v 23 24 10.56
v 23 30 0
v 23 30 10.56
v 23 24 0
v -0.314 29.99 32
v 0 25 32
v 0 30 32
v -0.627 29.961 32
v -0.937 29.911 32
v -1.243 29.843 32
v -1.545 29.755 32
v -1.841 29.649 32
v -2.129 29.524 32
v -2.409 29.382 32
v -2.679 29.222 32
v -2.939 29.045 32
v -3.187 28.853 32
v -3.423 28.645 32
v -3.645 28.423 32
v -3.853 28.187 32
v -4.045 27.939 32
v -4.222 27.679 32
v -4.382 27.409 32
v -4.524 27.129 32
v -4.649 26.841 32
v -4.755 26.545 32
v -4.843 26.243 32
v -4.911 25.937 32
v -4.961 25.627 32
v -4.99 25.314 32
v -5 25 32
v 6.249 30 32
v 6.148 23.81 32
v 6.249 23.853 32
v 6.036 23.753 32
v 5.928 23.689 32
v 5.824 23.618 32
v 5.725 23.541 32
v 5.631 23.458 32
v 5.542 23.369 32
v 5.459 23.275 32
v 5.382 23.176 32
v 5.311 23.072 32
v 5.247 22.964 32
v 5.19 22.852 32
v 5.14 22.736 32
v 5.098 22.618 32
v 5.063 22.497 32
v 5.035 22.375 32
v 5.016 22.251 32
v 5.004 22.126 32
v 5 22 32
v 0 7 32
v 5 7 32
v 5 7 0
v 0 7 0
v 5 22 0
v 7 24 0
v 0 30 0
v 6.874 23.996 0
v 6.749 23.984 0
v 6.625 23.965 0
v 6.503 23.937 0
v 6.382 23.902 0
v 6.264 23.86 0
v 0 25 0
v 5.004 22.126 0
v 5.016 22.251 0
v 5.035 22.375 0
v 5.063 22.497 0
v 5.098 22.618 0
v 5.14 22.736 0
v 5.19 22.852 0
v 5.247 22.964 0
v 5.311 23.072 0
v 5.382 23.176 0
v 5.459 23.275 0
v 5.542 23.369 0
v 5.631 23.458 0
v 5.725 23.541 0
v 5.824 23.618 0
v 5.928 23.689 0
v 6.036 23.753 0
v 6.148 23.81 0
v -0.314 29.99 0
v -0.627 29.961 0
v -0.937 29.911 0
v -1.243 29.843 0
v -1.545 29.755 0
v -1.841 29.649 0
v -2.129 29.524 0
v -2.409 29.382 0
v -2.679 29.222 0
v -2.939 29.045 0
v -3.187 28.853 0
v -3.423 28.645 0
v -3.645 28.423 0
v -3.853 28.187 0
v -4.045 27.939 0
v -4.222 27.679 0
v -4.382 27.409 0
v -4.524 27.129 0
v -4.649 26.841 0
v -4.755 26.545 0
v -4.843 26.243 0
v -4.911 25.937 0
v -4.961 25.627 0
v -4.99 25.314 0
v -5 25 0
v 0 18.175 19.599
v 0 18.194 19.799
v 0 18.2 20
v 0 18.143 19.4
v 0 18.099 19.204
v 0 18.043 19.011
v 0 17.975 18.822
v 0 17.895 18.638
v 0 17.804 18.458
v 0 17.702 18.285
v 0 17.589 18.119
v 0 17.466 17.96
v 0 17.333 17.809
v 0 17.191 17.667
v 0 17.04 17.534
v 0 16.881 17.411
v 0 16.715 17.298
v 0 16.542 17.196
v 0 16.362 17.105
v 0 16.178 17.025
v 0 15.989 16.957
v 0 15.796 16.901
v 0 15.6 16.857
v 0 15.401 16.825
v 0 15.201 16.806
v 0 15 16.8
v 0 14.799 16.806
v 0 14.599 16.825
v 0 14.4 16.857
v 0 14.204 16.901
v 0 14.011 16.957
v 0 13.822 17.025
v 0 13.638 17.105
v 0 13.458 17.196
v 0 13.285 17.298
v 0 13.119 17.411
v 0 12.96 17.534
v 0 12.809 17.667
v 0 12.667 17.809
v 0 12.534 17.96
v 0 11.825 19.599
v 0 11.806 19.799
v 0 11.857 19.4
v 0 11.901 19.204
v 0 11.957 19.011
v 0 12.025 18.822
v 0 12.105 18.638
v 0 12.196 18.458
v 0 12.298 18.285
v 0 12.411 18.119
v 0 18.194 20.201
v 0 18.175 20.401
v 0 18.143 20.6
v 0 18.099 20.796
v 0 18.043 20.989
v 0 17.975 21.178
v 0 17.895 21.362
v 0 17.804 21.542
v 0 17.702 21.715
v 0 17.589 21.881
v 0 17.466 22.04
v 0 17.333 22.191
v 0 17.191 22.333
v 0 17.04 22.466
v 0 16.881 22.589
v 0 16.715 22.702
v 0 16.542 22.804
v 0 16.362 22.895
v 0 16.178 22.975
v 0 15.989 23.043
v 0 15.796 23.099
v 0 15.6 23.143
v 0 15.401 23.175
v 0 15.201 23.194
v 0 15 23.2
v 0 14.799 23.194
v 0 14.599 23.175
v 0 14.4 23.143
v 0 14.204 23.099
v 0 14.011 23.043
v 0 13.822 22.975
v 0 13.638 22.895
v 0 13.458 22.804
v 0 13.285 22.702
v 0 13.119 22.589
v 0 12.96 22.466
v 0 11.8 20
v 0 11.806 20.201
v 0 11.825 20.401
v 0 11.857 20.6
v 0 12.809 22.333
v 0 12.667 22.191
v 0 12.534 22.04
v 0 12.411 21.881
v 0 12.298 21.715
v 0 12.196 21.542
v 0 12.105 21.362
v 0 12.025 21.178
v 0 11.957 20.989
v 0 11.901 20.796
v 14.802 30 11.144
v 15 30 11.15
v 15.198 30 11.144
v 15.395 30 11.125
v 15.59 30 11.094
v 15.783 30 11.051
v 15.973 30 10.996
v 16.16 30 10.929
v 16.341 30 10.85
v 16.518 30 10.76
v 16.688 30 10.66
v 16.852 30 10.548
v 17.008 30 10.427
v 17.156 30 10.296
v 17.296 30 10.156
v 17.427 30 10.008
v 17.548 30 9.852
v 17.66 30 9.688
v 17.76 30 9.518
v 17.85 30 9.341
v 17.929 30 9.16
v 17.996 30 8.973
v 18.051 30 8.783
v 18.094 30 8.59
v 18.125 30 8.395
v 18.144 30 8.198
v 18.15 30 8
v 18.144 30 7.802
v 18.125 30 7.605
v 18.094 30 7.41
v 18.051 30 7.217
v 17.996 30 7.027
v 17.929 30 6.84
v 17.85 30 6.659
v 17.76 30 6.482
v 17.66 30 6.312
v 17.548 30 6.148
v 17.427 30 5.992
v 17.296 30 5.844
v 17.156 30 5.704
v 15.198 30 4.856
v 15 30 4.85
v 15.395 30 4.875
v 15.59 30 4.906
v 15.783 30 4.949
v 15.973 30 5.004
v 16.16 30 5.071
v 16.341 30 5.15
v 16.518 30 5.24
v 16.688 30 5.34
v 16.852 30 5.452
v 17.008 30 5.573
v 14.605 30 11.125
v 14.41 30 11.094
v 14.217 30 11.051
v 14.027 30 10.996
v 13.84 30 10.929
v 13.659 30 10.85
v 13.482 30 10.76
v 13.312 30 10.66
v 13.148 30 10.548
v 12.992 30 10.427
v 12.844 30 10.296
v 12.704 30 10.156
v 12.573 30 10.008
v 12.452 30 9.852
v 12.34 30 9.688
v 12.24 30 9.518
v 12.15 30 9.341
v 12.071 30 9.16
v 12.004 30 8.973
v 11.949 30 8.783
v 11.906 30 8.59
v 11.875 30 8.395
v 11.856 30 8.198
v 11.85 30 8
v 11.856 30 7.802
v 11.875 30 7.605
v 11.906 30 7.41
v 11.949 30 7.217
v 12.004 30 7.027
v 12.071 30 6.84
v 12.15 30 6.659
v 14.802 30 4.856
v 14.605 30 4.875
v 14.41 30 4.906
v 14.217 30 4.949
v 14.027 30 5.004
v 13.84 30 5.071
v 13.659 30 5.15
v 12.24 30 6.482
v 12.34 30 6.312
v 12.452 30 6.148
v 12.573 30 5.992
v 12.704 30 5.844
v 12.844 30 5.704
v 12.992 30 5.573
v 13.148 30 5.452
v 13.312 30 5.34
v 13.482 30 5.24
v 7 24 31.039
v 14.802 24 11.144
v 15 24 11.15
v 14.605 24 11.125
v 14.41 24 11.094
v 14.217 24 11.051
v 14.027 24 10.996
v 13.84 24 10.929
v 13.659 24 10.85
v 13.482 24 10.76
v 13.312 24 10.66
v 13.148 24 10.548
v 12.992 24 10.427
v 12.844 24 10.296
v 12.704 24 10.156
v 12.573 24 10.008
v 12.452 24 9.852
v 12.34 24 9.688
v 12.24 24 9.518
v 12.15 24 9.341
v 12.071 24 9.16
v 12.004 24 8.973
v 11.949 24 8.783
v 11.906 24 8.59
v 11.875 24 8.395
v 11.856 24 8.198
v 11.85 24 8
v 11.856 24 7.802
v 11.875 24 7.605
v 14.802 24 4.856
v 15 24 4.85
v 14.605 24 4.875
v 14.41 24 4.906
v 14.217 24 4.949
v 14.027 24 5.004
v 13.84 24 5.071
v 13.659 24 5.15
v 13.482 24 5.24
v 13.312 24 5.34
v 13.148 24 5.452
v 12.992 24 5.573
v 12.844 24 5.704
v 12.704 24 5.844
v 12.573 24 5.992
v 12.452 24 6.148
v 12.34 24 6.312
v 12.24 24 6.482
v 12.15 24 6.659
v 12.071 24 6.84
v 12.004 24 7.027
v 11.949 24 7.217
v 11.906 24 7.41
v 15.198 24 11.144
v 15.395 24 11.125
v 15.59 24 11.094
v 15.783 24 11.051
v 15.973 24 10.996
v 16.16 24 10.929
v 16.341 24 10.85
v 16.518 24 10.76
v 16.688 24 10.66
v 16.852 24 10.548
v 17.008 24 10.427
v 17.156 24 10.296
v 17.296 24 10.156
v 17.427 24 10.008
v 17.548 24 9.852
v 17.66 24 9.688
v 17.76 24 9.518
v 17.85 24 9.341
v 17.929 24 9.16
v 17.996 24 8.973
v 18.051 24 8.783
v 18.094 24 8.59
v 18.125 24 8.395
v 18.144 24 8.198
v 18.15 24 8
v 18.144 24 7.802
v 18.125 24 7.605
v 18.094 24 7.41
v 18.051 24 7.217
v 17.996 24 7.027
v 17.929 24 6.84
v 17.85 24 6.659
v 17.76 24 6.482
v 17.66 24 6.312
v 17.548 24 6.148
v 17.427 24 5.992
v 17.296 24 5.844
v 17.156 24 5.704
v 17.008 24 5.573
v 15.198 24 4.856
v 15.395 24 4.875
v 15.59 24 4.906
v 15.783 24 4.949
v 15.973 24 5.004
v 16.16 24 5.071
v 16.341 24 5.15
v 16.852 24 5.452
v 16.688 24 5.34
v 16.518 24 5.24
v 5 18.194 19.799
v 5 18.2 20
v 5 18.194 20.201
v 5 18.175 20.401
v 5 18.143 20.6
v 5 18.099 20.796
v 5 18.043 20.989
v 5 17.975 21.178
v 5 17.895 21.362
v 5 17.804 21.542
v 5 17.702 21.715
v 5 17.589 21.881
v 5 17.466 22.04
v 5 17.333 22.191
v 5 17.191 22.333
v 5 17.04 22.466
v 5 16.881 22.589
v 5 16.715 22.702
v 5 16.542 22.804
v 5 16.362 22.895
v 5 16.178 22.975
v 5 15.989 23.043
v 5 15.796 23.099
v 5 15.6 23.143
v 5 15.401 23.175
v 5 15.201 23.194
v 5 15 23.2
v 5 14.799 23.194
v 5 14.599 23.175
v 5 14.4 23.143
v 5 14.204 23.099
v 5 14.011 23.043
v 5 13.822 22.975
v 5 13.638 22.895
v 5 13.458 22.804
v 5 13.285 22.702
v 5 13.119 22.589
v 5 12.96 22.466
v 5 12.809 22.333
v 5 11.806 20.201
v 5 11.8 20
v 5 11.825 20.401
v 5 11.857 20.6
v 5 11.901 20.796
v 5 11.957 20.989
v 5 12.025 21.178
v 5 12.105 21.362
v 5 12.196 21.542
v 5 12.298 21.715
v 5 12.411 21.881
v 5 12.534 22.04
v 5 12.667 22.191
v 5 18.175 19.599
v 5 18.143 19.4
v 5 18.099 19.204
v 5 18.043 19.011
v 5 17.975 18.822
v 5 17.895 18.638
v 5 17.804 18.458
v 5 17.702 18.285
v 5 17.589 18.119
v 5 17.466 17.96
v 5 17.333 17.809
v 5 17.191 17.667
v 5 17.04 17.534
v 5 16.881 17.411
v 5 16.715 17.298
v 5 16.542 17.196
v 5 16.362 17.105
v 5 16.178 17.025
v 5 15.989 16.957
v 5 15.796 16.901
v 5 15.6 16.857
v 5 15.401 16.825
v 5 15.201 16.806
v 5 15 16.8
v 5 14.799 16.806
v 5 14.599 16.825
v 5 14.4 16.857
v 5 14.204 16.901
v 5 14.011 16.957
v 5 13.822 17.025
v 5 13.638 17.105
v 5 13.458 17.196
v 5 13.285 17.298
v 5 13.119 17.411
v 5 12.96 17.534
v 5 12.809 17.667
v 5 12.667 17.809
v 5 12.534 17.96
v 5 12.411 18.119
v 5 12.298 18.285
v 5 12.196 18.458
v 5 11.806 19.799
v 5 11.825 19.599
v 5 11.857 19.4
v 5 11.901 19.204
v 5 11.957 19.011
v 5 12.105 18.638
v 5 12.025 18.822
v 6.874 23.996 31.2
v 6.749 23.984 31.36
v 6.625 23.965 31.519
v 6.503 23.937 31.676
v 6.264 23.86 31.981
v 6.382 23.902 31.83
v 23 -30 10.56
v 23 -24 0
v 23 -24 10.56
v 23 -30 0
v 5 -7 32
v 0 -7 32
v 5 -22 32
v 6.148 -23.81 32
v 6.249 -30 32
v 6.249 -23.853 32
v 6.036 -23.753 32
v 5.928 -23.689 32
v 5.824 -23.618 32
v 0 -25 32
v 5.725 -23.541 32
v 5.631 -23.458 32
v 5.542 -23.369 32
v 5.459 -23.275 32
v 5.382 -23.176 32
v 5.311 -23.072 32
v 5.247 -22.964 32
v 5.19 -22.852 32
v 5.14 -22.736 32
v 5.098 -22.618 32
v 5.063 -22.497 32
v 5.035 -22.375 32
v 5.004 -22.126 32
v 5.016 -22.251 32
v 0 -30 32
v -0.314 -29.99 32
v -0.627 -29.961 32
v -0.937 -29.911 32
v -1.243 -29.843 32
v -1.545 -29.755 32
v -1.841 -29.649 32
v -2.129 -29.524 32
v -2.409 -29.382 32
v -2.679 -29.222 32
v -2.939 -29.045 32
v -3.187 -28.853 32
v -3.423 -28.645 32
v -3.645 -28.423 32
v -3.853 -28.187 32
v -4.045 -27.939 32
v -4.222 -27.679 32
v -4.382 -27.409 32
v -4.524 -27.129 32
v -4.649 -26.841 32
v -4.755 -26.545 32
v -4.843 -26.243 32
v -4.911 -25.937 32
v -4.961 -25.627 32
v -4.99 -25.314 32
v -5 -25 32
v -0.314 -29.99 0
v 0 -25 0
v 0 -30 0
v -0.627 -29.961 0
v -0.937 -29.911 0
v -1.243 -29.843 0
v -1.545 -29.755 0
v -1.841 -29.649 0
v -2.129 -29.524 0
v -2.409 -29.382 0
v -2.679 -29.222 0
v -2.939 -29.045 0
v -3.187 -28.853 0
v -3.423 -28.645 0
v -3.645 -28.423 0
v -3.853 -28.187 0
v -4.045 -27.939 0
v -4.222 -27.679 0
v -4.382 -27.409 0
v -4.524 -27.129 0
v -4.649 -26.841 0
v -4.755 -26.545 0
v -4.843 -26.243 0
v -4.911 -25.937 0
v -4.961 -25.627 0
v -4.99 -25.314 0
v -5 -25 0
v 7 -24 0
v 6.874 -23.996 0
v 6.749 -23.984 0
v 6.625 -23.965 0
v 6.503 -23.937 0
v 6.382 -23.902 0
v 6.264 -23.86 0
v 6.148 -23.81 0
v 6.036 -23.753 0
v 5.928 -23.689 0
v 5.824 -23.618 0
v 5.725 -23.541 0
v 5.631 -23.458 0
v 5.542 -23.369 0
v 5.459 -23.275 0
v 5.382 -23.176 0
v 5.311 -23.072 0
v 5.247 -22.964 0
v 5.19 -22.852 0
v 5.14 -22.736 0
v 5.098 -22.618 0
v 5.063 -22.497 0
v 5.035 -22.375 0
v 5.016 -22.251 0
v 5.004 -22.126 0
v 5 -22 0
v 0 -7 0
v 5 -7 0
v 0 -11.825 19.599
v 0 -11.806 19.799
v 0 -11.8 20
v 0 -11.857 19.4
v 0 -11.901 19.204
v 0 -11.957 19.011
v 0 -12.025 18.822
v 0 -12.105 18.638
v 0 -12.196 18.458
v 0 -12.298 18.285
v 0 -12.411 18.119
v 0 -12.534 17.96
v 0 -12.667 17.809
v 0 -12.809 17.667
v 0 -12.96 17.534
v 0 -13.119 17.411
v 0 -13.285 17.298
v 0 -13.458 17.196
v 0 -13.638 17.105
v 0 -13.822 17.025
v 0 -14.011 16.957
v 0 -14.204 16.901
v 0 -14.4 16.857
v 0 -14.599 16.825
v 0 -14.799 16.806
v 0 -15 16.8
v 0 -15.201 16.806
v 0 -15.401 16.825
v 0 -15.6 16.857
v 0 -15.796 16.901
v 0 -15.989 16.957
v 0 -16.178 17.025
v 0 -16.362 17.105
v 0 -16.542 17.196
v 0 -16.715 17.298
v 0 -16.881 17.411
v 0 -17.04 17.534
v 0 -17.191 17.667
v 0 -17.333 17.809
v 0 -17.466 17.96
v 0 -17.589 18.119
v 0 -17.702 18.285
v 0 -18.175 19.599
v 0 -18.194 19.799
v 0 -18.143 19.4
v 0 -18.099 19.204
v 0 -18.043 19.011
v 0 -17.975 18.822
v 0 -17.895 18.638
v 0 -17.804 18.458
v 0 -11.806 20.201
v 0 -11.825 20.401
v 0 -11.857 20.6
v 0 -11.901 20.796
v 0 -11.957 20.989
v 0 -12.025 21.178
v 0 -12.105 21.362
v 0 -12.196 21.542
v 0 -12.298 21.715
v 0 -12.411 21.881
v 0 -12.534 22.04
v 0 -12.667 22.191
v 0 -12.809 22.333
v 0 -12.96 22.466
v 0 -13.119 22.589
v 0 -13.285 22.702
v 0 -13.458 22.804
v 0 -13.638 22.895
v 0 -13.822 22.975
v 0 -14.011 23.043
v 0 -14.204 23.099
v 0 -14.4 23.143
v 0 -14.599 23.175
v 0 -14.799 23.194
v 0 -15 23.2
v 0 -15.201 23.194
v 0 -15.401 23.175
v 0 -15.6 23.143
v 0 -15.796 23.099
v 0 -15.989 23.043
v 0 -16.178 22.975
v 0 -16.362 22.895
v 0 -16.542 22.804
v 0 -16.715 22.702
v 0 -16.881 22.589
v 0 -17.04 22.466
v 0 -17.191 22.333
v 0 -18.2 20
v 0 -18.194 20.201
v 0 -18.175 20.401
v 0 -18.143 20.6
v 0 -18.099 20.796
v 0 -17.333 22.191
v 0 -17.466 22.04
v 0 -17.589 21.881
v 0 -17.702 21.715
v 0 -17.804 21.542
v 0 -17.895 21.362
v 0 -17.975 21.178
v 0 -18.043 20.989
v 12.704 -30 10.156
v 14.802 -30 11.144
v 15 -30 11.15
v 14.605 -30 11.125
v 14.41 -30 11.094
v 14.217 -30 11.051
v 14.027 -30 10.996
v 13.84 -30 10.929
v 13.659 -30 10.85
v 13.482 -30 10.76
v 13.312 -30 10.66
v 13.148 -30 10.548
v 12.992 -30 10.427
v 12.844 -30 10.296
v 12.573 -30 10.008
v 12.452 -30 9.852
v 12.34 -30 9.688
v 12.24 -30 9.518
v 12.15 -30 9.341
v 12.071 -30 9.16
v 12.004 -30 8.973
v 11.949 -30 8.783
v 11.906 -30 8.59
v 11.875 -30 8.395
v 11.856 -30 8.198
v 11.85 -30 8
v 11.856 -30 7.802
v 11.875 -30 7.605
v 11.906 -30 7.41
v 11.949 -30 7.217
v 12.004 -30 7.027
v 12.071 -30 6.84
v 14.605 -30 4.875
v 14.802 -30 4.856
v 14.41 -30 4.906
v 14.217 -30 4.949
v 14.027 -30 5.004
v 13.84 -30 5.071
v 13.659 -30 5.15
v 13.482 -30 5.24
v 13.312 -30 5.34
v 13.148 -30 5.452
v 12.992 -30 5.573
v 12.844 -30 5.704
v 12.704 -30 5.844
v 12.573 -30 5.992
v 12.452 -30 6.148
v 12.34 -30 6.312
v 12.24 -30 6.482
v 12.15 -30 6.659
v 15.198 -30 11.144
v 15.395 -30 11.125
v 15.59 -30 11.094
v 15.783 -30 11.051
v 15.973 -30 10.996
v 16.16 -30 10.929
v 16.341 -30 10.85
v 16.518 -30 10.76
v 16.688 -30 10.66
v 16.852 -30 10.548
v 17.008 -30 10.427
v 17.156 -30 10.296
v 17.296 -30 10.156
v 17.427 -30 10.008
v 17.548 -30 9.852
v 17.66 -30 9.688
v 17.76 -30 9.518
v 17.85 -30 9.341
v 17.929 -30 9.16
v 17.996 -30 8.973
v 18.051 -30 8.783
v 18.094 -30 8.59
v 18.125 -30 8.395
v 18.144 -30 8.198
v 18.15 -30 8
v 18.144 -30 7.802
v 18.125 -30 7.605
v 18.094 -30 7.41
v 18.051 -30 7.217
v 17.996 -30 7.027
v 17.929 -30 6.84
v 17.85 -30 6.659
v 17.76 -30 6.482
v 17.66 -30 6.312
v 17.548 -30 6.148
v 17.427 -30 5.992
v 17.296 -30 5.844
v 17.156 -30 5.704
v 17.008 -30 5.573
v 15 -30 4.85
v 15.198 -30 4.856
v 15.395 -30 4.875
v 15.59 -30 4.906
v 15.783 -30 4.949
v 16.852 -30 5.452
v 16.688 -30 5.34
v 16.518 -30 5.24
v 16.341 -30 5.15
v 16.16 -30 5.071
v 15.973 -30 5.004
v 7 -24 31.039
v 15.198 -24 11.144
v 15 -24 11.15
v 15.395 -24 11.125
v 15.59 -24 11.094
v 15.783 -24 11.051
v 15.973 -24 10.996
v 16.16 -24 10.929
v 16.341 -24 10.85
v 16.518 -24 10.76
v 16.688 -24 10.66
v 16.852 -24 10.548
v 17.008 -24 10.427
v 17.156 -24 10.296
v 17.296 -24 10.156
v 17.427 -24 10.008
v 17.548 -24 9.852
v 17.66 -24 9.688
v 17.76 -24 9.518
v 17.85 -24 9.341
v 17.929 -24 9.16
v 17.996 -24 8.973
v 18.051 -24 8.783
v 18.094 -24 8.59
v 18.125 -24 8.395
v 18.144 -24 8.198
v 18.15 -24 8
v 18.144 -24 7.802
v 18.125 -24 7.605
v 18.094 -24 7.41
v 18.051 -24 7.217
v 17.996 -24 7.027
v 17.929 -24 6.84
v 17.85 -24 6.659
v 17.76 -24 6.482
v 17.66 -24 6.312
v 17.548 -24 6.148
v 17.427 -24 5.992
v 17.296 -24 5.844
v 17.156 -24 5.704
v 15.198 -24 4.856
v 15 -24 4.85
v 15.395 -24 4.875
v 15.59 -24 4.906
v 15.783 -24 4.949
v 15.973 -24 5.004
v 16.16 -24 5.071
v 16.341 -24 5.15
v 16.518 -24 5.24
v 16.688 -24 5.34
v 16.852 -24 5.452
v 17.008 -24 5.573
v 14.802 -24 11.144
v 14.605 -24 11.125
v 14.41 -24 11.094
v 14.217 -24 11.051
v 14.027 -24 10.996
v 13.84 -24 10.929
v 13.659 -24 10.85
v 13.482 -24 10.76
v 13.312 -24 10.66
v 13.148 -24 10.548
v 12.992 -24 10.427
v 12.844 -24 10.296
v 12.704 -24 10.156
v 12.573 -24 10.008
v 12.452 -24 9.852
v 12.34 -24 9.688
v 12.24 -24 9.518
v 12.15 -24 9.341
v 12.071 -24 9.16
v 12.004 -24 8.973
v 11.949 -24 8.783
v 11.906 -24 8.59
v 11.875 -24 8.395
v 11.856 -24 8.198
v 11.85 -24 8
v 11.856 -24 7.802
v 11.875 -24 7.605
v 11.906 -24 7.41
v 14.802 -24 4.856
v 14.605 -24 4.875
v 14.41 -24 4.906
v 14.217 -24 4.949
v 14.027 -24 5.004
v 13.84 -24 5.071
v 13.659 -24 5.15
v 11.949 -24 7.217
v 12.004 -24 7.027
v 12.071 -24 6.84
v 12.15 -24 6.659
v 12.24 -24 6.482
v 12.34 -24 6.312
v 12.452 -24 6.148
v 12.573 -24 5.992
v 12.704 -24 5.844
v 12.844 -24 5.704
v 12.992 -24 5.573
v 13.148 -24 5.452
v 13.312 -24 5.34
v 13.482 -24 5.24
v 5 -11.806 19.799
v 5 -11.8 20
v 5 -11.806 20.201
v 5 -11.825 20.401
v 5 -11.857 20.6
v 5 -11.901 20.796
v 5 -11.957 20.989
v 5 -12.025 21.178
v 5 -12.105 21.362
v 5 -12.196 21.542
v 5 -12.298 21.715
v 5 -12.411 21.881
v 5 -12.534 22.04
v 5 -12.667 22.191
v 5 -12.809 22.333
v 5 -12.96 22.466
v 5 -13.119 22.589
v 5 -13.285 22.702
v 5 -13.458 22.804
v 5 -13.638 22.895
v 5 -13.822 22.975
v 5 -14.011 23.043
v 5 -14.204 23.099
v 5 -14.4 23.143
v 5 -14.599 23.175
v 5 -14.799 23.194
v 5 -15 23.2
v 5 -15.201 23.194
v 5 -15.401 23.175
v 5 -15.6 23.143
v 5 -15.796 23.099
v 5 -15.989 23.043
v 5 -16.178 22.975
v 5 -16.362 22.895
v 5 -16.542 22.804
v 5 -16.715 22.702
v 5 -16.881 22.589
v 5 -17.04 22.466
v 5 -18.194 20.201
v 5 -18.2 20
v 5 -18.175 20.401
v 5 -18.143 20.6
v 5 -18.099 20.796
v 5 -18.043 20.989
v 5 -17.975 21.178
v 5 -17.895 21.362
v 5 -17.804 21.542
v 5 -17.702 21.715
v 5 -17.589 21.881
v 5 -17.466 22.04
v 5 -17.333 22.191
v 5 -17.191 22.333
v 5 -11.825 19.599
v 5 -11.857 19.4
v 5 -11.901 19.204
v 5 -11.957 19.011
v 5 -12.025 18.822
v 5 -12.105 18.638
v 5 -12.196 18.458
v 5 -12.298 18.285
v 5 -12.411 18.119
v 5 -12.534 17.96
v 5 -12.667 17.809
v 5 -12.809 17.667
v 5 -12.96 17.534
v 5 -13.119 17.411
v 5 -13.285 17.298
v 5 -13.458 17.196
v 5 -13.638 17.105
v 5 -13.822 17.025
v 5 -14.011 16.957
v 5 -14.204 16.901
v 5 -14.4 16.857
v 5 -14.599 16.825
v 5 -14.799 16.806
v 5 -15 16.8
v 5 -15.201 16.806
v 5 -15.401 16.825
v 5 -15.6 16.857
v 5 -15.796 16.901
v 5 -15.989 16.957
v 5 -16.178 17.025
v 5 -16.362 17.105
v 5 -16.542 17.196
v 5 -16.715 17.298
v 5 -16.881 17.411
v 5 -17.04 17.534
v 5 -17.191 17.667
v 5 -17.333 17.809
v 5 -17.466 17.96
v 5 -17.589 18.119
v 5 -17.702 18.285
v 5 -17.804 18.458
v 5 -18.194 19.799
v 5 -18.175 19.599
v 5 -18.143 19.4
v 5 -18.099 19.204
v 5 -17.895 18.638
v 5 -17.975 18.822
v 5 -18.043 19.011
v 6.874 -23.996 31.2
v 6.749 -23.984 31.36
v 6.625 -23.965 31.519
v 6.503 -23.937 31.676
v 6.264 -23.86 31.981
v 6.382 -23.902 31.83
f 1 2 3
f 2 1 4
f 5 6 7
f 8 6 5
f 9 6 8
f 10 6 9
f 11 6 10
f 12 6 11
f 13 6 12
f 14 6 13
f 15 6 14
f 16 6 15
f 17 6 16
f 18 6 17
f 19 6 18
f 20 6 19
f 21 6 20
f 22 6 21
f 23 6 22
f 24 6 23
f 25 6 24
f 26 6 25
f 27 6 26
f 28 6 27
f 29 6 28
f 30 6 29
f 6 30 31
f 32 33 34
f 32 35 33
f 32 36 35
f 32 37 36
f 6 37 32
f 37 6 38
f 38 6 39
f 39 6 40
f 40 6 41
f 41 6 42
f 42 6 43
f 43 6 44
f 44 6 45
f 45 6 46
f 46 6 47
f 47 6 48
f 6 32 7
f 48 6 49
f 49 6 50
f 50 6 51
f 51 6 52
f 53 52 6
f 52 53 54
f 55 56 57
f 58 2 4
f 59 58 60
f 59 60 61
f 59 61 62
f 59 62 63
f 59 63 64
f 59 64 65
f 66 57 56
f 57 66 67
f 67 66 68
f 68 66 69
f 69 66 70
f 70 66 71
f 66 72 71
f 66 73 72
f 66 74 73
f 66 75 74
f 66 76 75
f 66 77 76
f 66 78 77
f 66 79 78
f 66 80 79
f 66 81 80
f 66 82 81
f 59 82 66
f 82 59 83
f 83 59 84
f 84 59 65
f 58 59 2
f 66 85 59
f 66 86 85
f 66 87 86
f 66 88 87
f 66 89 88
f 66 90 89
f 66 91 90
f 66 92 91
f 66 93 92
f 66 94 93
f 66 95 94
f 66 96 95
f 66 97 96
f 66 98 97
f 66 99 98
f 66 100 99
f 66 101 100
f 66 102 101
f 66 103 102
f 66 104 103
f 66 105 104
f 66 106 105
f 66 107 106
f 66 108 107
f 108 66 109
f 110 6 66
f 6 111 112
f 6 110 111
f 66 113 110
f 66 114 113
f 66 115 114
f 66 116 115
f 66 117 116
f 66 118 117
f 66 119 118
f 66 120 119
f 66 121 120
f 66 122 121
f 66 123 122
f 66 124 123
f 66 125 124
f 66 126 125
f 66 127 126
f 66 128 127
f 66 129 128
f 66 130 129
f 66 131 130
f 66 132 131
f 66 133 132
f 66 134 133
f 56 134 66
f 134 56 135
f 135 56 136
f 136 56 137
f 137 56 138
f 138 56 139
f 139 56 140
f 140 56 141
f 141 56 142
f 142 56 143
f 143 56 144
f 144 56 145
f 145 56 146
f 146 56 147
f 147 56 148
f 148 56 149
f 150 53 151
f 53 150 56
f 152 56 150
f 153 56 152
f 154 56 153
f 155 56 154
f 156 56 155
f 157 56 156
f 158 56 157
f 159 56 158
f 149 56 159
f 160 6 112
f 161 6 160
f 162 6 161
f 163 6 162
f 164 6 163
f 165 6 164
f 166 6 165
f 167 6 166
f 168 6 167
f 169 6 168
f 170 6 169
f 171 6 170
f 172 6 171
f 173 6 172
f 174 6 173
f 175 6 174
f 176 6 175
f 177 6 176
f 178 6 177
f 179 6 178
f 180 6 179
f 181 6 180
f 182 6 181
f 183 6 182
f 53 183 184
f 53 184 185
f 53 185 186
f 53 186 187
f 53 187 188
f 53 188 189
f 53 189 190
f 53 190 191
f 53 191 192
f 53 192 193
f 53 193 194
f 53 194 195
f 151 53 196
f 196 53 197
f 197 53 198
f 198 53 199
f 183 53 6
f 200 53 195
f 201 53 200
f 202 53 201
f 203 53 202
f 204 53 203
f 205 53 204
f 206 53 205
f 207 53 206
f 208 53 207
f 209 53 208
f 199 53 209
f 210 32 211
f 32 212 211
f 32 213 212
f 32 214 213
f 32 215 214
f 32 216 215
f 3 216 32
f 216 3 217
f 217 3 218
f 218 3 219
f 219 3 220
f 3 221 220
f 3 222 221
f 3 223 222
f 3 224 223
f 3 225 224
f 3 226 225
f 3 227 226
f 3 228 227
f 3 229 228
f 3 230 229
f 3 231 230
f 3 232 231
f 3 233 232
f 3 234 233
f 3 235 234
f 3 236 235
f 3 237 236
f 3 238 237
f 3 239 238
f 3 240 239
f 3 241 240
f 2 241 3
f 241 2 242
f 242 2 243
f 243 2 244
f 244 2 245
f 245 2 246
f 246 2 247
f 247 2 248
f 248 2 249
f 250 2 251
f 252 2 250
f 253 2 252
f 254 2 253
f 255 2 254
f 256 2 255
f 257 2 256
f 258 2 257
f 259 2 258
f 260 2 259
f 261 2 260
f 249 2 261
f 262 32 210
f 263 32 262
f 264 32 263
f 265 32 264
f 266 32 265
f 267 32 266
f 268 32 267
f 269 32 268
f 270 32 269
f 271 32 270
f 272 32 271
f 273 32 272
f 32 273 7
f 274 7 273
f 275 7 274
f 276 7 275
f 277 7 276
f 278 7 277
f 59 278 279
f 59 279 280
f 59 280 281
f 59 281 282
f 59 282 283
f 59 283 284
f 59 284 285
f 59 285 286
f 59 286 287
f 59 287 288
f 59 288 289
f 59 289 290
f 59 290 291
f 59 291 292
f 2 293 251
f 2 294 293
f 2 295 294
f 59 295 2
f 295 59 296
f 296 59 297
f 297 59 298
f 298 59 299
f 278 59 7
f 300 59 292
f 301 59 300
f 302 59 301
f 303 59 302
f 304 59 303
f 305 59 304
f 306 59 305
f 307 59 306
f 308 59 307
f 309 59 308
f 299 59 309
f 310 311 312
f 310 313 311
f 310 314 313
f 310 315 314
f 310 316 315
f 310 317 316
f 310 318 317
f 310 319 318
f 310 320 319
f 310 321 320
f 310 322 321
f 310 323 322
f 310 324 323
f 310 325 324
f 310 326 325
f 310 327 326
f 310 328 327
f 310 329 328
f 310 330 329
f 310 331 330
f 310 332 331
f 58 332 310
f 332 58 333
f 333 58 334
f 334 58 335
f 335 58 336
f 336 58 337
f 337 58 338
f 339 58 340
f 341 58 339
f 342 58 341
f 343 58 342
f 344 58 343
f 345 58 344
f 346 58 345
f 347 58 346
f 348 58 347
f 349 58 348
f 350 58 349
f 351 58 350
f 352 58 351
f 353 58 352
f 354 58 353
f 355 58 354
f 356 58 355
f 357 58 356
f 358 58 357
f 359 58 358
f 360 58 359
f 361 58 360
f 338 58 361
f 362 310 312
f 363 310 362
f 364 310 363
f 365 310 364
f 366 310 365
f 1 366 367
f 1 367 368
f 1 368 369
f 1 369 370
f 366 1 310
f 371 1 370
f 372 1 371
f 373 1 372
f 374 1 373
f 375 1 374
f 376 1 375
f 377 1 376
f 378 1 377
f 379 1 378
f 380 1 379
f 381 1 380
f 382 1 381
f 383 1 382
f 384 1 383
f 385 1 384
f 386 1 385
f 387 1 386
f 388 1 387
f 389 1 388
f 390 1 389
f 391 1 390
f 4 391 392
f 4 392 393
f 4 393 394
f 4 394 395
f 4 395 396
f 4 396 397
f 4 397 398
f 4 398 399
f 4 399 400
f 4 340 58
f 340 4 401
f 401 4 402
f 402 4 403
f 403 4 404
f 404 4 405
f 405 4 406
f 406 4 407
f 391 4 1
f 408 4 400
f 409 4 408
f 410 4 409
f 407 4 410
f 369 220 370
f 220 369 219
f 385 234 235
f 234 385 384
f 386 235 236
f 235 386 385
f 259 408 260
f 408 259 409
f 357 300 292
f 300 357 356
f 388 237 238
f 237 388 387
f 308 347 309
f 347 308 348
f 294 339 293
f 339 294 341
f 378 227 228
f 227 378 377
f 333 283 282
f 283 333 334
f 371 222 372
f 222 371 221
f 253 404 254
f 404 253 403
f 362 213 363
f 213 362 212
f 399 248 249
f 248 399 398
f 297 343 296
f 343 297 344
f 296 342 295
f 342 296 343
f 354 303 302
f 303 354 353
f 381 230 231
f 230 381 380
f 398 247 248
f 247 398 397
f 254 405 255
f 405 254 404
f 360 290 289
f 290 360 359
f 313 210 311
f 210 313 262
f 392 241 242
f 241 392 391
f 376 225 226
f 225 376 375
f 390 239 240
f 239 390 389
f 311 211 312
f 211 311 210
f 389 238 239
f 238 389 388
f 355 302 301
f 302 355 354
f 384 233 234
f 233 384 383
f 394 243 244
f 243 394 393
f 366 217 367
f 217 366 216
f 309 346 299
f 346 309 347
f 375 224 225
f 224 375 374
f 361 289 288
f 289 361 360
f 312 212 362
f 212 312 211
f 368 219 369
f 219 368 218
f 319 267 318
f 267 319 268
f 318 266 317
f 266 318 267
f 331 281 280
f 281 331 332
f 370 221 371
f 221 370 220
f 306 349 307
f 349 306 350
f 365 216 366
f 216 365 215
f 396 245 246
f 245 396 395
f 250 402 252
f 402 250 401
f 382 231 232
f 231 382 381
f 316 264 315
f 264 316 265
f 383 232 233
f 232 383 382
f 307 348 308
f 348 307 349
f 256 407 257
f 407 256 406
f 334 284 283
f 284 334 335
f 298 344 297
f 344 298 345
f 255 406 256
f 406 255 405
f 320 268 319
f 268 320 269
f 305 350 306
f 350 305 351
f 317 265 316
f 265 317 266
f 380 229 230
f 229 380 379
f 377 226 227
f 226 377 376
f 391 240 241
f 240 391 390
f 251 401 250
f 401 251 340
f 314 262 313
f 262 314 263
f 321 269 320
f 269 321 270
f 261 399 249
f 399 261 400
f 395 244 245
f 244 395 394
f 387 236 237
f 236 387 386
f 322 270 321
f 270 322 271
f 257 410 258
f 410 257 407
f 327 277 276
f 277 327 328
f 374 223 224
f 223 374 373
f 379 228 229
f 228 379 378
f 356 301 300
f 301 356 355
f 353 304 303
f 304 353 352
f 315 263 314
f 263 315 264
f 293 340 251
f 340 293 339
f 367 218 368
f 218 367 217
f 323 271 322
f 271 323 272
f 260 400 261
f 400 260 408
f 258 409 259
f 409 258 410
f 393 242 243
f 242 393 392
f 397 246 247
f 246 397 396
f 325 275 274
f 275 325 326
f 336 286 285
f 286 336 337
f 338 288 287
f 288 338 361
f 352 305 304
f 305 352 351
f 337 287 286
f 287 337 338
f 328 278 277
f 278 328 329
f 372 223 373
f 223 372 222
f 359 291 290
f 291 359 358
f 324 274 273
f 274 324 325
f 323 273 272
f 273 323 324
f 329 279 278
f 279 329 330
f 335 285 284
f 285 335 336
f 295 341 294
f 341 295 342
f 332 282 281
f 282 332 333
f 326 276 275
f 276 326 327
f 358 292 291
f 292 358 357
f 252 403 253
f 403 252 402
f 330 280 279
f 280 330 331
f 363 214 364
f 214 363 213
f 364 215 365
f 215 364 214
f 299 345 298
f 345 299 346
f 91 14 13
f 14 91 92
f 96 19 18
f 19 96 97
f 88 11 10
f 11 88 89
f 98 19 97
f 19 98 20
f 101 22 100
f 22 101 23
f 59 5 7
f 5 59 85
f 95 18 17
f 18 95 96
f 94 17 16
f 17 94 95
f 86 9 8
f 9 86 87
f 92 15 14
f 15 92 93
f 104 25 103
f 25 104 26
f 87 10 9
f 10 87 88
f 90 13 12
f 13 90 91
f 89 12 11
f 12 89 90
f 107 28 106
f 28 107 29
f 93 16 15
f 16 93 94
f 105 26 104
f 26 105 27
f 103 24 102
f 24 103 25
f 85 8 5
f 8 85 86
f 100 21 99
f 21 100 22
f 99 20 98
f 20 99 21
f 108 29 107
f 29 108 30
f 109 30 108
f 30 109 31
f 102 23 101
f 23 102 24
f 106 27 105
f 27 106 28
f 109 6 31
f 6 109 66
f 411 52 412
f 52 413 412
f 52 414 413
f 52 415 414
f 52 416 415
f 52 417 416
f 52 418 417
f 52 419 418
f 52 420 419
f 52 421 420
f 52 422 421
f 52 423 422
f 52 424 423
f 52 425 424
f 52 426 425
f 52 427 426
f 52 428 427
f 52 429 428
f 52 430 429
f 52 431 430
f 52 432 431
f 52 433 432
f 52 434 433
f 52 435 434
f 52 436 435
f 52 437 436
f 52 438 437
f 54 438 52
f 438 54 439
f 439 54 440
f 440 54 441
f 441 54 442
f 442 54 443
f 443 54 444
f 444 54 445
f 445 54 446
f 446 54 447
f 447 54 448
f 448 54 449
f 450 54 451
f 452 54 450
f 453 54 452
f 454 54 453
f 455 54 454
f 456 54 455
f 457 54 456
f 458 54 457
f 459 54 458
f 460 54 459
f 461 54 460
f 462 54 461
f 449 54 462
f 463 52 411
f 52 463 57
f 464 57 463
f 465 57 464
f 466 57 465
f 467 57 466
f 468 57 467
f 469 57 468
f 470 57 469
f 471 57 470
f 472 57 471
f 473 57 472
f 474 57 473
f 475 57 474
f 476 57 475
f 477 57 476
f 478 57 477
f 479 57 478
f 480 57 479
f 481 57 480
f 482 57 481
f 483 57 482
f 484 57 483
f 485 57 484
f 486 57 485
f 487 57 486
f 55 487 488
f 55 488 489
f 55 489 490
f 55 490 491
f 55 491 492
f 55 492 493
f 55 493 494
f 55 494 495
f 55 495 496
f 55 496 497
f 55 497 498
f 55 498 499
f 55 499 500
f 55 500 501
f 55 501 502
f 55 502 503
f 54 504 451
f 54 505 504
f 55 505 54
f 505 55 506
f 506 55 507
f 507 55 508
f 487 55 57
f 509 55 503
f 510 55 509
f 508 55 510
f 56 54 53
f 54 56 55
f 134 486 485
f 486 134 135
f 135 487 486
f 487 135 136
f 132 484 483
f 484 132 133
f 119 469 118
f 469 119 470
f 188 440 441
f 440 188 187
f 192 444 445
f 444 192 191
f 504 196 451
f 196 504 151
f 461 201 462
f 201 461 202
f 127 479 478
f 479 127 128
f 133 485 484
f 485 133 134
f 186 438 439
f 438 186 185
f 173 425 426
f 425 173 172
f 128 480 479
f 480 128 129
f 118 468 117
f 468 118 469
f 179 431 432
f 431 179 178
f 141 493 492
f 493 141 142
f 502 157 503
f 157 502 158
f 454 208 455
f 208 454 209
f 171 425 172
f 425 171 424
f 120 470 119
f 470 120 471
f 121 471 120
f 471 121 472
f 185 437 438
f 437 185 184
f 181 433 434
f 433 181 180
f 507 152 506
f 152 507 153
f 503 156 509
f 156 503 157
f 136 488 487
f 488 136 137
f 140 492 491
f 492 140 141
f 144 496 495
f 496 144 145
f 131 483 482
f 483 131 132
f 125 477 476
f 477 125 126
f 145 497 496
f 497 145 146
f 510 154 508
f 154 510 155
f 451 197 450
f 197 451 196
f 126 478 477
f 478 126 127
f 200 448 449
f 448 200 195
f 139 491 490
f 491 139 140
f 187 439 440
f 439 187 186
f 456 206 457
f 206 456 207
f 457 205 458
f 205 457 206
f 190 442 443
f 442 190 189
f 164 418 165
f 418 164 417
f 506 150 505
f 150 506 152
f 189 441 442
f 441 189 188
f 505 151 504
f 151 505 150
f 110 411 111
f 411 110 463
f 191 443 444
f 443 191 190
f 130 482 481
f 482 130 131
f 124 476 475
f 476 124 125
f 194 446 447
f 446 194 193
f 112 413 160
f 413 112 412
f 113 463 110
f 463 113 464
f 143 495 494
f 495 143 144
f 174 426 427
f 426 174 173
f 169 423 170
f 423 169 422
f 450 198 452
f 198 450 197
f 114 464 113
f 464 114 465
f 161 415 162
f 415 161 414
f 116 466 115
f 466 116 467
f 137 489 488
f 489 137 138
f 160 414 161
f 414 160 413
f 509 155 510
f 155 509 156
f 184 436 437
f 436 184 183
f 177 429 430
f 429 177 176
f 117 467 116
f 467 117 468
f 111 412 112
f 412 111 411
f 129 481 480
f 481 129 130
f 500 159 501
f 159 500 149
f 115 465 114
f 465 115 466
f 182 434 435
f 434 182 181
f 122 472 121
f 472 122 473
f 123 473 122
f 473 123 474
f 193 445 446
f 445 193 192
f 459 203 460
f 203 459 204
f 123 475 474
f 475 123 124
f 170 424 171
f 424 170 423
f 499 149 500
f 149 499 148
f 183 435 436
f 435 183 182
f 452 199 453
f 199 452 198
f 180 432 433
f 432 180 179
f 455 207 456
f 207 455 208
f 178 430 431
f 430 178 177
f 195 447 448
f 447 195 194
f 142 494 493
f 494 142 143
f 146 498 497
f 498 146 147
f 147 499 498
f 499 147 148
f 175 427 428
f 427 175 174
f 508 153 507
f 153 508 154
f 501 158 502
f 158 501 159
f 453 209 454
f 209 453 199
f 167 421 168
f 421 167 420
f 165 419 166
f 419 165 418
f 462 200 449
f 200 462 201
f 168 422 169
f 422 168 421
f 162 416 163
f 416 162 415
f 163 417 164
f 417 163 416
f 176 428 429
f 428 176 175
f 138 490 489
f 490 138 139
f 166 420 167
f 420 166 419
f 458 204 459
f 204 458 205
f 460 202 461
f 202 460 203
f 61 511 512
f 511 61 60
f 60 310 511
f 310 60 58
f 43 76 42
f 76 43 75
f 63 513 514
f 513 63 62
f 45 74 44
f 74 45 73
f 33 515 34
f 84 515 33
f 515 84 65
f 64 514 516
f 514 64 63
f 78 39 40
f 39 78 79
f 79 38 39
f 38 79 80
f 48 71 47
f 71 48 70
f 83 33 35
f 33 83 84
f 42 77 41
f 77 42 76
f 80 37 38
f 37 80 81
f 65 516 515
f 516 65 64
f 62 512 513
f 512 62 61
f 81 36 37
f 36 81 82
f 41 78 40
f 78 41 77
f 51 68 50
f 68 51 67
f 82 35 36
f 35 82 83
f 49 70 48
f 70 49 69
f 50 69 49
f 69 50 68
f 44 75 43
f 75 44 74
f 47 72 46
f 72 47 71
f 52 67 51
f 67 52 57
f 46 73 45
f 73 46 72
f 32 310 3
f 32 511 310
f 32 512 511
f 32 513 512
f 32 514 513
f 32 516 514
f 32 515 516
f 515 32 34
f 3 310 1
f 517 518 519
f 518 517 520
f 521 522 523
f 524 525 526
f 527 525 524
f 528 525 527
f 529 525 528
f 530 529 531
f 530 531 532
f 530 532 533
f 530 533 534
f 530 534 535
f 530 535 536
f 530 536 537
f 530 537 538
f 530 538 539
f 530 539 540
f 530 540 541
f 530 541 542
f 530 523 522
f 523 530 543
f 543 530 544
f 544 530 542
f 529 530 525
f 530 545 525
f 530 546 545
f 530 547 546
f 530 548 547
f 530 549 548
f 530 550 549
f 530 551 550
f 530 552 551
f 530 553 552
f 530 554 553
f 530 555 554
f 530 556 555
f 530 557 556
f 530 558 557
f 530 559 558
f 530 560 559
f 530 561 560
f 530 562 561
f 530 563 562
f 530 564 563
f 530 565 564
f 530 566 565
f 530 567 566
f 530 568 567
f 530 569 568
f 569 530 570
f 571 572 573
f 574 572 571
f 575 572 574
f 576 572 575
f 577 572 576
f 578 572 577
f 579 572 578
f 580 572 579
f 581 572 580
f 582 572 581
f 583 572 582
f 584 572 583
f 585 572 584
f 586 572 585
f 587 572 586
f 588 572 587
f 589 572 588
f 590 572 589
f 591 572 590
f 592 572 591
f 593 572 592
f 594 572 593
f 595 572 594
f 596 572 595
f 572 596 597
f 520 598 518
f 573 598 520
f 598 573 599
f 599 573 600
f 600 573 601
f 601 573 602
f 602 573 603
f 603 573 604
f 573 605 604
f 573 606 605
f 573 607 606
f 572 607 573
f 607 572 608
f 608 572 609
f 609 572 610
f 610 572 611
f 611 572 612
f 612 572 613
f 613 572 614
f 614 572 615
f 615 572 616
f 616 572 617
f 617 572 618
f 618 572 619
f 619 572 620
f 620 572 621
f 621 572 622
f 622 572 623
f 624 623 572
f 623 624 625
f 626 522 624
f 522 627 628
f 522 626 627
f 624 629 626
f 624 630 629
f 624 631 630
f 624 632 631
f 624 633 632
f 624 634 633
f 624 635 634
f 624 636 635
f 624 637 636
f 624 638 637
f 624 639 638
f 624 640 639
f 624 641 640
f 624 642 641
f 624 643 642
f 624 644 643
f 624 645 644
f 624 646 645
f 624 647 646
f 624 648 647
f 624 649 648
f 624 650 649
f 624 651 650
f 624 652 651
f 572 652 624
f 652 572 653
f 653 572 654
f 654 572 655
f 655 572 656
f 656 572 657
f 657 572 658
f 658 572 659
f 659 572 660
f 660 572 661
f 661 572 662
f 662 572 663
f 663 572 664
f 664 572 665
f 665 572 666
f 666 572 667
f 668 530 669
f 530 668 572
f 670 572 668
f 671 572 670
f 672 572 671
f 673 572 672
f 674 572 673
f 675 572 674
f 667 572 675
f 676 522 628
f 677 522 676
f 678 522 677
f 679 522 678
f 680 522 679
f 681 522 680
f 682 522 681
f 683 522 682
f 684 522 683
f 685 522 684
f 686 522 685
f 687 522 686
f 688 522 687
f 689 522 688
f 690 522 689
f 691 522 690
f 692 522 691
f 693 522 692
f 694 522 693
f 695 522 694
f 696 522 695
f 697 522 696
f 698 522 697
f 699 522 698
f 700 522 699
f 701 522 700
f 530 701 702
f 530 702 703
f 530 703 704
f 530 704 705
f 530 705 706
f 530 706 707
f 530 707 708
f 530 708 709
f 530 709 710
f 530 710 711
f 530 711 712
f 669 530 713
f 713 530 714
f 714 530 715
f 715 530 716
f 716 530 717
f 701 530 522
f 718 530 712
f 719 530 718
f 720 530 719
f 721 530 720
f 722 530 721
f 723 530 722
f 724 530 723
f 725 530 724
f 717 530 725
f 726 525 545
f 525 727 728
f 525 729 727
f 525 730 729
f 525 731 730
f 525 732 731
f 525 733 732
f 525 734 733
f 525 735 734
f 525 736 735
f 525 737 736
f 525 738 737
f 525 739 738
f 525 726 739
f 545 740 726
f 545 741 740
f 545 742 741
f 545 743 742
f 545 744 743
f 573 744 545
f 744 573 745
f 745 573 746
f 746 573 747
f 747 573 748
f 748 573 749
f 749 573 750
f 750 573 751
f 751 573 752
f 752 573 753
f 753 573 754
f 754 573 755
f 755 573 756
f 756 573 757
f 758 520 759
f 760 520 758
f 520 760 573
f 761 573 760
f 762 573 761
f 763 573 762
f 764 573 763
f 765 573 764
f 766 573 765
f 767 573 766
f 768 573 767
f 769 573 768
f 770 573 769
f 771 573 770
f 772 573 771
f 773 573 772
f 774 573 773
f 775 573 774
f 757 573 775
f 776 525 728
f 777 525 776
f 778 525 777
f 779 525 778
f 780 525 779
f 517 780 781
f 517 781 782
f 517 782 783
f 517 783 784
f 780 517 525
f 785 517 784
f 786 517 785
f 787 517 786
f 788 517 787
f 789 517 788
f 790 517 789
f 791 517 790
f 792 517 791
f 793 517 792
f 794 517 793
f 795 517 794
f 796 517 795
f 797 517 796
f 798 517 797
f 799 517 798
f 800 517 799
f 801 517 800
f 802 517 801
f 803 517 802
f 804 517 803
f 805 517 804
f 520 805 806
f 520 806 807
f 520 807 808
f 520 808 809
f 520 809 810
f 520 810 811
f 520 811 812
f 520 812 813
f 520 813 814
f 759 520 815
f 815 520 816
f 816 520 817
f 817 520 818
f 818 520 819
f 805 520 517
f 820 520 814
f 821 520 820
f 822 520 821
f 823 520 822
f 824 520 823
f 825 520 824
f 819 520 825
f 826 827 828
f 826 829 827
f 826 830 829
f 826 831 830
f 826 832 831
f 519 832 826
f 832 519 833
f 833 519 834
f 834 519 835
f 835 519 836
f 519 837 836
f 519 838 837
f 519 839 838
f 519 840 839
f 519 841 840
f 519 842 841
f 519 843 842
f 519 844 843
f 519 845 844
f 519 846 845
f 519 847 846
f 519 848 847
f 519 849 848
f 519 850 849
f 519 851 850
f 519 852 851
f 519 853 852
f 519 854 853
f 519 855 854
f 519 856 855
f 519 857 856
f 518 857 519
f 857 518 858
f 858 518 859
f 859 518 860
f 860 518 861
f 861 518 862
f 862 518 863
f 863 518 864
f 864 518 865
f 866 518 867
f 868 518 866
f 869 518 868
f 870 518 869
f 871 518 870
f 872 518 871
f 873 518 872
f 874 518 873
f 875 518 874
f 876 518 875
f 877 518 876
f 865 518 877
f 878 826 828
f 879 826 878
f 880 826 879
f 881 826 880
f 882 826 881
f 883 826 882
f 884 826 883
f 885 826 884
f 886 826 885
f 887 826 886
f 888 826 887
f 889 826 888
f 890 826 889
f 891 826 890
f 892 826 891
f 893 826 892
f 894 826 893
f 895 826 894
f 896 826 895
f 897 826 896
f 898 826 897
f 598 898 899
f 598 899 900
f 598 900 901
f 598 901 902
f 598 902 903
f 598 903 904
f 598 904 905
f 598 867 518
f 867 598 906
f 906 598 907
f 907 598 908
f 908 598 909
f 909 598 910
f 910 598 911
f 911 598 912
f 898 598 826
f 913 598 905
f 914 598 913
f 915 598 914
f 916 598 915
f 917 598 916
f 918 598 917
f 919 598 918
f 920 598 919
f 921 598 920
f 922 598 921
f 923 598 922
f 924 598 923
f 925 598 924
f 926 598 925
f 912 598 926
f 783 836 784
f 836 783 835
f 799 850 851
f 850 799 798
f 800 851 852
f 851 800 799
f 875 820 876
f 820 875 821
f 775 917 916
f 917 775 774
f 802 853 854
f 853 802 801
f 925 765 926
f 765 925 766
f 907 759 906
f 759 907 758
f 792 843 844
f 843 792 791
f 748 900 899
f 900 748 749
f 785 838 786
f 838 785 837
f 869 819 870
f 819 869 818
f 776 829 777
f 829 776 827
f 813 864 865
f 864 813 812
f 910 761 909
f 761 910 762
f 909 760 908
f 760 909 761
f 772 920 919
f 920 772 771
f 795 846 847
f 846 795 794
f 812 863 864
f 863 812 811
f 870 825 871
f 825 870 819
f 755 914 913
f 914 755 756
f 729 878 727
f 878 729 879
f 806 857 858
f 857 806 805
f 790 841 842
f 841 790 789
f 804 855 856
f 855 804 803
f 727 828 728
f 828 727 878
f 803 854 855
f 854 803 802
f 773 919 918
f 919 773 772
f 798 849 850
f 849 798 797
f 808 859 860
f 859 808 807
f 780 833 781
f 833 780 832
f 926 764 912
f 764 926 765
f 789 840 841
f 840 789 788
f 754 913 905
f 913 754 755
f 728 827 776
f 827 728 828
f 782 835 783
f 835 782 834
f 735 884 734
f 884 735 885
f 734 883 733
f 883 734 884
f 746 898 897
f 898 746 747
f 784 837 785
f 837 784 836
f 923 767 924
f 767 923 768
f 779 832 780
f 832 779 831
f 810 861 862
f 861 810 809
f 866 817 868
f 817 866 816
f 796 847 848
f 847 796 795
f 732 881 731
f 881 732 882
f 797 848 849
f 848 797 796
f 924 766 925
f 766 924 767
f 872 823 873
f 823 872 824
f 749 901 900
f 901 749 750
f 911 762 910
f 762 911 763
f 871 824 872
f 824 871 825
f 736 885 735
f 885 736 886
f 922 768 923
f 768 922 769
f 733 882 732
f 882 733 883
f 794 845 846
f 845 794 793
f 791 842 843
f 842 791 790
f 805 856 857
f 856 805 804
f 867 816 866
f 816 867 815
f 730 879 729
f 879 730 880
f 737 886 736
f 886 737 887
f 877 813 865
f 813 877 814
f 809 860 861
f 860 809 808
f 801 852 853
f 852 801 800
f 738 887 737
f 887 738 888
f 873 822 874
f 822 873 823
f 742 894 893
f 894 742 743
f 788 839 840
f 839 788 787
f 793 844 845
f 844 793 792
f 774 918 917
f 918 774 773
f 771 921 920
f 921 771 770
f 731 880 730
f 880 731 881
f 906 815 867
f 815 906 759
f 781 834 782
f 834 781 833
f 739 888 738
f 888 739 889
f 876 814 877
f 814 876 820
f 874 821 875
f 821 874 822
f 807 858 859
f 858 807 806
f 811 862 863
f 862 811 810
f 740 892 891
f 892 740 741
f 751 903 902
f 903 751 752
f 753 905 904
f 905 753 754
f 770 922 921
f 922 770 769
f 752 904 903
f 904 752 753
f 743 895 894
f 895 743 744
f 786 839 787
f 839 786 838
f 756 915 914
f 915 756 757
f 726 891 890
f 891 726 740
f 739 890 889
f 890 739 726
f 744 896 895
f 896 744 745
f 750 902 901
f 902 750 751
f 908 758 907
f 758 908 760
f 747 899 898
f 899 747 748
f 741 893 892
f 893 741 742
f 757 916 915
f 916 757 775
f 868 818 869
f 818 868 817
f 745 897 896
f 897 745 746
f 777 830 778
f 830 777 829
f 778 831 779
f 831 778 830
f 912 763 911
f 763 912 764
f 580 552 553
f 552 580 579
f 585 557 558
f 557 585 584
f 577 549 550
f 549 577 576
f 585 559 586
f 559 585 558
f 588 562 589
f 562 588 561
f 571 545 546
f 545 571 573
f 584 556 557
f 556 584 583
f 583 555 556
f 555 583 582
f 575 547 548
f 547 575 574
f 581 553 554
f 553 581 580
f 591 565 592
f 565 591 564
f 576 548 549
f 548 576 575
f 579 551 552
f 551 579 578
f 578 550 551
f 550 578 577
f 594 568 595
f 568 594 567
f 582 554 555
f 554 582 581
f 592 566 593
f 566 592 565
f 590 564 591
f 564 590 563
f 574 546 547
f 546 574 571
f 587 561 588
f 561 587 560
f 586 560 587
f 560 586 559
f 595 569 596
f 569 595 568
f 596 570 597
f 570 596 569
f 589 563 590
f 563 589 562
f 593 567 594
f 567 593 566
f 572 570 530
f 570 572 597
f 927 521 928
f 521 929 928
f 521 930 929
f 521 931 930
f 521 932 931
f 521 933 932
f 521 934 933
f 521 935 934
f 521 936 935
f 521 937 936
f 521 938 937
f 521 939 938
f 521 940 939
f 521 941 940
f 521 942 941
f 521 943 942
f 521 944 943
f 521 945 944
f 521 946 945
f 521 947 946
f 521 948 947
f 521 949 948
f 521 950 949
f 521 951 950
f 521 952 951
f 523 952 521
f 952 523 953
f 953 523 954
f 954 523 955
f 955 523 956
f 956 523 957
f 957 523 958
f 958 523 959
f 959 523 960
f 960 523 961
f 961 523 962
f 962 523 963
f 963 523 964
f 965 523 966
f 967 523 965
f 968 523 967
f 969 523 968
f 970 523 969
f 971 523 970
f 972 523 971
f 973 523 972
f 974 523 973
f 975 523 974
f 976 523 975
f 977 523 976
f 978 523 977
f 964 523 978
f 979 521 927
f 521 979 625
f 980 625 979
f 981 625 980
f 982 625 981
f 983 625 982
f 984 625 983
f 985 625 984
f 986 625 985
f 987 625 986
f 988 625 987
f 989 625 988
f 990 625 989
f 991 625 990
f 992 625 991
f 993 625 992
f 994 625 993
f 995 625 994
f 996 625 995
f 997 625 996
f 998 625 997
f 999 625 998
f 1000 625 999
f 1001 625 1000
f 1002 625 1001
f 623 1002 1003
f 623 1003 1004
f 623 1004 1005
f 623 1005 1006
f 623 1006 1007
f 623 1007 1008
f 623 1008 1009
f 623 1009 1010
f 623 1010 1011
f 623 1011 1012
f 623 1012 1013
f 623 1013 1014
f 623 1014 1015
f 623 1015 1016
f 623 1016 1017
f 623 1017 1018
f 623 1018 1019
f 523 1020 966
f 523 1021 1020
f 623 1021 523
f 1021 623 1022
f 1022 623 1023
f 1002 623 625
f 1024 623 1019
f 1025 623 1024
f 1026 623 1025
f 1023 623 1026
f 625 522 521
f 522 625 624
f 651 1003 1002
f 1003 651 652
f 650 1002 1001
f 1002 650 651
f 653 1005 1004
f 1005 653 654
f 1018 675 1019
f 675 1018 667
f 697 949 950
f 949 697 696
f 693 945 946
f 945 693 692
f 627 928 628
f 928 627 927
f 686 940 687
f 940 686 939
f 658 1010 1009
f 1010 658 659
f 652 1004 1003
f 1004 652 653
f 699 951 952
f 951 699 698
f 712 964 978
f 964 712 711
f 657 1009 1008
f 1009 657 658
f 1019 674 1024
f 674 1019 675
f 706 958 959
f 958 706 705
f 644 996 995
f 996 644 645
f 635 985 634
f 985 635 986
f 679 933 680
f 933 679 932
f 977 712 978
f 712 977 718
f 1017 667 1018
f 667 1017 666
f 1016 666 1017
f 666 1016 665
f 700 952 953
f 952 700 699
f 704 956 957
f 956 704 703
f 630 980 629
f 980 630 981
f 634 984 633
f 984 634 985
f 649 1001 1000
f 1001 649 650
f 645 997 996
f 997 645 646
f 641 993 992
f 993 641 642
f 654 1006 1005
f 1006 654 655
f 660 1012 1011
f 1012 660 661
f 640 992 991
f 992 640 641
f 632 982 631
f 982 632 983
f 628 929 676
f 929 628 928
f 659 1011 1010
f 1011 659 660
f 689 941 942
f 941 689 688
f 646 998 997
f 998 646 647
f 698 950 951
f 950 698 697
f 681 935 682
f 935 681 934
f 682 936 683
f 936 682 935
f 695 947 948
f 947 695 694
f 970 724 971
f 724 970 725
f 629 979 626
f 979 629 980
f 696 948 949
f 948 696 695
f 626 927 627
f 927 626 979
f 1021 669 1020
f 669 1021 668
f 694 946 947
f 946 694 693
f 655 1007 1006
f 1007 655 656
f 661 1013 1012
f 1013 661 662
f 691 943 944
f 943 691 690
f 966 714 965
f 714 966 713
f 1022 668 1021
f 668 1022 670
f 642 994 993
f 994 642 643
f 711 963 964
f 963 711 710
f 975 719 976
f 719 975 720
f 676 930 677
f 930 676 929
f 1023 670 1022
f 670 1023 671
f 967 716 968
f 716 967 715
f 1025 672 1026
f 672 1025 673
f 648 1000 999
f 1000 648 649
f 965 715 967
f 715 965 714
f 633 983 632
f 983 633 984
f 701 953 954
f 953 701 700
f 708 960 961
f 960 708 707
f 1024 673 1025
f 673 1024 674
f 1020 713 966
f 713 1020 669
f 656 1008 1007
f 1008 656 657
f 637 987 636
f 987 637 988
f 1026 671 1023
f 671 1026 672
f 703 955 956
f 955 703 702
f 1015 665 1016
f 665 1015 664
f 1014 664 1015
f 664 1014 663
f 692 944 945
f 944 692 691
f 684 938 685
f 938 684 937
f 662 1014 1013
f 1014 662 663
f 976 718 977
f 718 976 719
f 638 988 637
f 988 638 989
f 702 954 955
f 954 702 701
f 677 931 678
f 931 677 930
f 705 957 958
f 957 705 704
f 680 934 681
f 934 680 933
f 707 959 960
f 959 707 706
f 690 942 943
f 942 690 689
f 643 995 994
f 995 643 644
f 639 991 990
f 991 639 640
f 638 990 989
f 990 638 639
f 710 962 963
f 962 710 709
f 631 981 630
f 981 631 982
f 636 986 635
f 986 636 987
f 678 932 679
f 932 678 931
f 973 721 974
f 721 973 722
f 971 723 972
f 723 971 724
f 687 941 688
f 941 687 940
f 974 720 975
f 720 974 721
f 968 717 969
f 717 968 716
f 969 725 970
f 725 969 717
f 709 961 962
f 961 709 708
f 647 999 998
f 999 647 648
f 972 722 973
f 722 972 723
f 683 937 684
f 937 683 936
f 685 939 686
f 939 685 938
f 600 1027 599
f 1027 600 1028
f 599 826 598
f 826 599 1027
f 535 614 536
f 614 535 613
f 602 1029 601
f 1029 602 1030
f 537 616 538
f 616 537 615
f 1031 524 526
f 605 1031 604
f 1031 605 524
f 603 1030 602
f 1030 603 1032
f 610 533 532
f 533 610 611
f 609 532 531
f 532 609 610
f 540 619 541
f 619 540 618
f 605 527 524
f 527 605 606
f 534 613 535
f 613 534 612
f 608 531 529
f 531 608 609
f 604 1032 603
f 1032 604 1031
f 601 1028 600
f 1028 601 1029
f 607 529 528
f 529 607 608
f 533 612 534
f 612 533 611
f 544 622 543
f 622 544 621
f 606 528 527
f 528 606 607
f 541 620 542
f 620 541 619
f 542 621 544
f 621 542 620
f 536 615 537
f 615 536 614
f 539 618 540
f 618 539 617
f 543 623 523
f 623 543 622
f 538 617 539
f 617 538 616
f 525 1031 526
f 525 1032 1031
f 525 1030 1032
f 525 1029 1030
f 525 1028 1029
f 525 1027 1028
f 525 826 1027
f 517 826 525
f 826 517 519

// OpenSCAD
// Created from Code_Diagonal (x2).stl
// https://github.com/Mecan0/Code
// By J.Rodigo (www.jra.so)
// Licence Creative commons atribution & share alike.

/**************************/
// Parámetros de la pieza  /
/**************************/

dTalaX = 6.3;	//Diámetro del taladro del bloque X 

dTalaY = 6.4;	//Diámetro del taladro del bloque Y 


// Bloque a lo largo del eje X
module bloqueX(){
	// Bloque y taladro
	difference () {
		translate([0, -6, 0])
		cube([23, 6, 32]);
	
		translate([15, 1, 8])
		rotate( 90, [1, 0, 0])
		cylinder(h = 8, r = dTalaX/2, $fn=100);
	}

	// Esquina redondeada
	difference () {
		translate([0, -5, 0])
		cylinder(h = 32, r = 5, $fn=100);

		translate([-5, -10, -1])
		cube([10, 5, 34]);
	}	
}

// Bloque a lo largo del eje Y
module bloqueY(){
	// Bloque y taladro
	difference () {
		translate([0, -23, 0])
		cube([5, 23, 32]);

		translate([-1, -15, 20])
		rotate( 90, [0, 1, 0])
		cylinder(h = 7, r = dTalaY/2, $fn=100);
	}
}

// Redondeo entre los bloques X y Y
module redondeoXY(){
	difference () {
		cube([2, 2, 32]);
		
		translate([2, 0, -1])
		cylinder(h = 34, r = 2, $fn=100);
	}
}

// Unión de todos los bloques
module pieza(){
	difference () {
		union() {
			bloqueX();

			bloqueY();

			translate([5, -8, 0])
			redondeoXY();
		}	

		//Chaflan que afecta al bloqueX() y al redondeoXY()
		translate([23, -7, 10.56])
		rotate( 38, [0, -1, 0])
		cube([18, 8, 34]);	
	}
}

/**************************/
//  Generamos las piezas   /
/**************************/

// Pieza normal

	translate([0, 30, 0])
	pieza();

// Pieza simetrica

	translate([0, -30, 0])
	mirror([ 0, 1, 0 ]) 
	pieza();
